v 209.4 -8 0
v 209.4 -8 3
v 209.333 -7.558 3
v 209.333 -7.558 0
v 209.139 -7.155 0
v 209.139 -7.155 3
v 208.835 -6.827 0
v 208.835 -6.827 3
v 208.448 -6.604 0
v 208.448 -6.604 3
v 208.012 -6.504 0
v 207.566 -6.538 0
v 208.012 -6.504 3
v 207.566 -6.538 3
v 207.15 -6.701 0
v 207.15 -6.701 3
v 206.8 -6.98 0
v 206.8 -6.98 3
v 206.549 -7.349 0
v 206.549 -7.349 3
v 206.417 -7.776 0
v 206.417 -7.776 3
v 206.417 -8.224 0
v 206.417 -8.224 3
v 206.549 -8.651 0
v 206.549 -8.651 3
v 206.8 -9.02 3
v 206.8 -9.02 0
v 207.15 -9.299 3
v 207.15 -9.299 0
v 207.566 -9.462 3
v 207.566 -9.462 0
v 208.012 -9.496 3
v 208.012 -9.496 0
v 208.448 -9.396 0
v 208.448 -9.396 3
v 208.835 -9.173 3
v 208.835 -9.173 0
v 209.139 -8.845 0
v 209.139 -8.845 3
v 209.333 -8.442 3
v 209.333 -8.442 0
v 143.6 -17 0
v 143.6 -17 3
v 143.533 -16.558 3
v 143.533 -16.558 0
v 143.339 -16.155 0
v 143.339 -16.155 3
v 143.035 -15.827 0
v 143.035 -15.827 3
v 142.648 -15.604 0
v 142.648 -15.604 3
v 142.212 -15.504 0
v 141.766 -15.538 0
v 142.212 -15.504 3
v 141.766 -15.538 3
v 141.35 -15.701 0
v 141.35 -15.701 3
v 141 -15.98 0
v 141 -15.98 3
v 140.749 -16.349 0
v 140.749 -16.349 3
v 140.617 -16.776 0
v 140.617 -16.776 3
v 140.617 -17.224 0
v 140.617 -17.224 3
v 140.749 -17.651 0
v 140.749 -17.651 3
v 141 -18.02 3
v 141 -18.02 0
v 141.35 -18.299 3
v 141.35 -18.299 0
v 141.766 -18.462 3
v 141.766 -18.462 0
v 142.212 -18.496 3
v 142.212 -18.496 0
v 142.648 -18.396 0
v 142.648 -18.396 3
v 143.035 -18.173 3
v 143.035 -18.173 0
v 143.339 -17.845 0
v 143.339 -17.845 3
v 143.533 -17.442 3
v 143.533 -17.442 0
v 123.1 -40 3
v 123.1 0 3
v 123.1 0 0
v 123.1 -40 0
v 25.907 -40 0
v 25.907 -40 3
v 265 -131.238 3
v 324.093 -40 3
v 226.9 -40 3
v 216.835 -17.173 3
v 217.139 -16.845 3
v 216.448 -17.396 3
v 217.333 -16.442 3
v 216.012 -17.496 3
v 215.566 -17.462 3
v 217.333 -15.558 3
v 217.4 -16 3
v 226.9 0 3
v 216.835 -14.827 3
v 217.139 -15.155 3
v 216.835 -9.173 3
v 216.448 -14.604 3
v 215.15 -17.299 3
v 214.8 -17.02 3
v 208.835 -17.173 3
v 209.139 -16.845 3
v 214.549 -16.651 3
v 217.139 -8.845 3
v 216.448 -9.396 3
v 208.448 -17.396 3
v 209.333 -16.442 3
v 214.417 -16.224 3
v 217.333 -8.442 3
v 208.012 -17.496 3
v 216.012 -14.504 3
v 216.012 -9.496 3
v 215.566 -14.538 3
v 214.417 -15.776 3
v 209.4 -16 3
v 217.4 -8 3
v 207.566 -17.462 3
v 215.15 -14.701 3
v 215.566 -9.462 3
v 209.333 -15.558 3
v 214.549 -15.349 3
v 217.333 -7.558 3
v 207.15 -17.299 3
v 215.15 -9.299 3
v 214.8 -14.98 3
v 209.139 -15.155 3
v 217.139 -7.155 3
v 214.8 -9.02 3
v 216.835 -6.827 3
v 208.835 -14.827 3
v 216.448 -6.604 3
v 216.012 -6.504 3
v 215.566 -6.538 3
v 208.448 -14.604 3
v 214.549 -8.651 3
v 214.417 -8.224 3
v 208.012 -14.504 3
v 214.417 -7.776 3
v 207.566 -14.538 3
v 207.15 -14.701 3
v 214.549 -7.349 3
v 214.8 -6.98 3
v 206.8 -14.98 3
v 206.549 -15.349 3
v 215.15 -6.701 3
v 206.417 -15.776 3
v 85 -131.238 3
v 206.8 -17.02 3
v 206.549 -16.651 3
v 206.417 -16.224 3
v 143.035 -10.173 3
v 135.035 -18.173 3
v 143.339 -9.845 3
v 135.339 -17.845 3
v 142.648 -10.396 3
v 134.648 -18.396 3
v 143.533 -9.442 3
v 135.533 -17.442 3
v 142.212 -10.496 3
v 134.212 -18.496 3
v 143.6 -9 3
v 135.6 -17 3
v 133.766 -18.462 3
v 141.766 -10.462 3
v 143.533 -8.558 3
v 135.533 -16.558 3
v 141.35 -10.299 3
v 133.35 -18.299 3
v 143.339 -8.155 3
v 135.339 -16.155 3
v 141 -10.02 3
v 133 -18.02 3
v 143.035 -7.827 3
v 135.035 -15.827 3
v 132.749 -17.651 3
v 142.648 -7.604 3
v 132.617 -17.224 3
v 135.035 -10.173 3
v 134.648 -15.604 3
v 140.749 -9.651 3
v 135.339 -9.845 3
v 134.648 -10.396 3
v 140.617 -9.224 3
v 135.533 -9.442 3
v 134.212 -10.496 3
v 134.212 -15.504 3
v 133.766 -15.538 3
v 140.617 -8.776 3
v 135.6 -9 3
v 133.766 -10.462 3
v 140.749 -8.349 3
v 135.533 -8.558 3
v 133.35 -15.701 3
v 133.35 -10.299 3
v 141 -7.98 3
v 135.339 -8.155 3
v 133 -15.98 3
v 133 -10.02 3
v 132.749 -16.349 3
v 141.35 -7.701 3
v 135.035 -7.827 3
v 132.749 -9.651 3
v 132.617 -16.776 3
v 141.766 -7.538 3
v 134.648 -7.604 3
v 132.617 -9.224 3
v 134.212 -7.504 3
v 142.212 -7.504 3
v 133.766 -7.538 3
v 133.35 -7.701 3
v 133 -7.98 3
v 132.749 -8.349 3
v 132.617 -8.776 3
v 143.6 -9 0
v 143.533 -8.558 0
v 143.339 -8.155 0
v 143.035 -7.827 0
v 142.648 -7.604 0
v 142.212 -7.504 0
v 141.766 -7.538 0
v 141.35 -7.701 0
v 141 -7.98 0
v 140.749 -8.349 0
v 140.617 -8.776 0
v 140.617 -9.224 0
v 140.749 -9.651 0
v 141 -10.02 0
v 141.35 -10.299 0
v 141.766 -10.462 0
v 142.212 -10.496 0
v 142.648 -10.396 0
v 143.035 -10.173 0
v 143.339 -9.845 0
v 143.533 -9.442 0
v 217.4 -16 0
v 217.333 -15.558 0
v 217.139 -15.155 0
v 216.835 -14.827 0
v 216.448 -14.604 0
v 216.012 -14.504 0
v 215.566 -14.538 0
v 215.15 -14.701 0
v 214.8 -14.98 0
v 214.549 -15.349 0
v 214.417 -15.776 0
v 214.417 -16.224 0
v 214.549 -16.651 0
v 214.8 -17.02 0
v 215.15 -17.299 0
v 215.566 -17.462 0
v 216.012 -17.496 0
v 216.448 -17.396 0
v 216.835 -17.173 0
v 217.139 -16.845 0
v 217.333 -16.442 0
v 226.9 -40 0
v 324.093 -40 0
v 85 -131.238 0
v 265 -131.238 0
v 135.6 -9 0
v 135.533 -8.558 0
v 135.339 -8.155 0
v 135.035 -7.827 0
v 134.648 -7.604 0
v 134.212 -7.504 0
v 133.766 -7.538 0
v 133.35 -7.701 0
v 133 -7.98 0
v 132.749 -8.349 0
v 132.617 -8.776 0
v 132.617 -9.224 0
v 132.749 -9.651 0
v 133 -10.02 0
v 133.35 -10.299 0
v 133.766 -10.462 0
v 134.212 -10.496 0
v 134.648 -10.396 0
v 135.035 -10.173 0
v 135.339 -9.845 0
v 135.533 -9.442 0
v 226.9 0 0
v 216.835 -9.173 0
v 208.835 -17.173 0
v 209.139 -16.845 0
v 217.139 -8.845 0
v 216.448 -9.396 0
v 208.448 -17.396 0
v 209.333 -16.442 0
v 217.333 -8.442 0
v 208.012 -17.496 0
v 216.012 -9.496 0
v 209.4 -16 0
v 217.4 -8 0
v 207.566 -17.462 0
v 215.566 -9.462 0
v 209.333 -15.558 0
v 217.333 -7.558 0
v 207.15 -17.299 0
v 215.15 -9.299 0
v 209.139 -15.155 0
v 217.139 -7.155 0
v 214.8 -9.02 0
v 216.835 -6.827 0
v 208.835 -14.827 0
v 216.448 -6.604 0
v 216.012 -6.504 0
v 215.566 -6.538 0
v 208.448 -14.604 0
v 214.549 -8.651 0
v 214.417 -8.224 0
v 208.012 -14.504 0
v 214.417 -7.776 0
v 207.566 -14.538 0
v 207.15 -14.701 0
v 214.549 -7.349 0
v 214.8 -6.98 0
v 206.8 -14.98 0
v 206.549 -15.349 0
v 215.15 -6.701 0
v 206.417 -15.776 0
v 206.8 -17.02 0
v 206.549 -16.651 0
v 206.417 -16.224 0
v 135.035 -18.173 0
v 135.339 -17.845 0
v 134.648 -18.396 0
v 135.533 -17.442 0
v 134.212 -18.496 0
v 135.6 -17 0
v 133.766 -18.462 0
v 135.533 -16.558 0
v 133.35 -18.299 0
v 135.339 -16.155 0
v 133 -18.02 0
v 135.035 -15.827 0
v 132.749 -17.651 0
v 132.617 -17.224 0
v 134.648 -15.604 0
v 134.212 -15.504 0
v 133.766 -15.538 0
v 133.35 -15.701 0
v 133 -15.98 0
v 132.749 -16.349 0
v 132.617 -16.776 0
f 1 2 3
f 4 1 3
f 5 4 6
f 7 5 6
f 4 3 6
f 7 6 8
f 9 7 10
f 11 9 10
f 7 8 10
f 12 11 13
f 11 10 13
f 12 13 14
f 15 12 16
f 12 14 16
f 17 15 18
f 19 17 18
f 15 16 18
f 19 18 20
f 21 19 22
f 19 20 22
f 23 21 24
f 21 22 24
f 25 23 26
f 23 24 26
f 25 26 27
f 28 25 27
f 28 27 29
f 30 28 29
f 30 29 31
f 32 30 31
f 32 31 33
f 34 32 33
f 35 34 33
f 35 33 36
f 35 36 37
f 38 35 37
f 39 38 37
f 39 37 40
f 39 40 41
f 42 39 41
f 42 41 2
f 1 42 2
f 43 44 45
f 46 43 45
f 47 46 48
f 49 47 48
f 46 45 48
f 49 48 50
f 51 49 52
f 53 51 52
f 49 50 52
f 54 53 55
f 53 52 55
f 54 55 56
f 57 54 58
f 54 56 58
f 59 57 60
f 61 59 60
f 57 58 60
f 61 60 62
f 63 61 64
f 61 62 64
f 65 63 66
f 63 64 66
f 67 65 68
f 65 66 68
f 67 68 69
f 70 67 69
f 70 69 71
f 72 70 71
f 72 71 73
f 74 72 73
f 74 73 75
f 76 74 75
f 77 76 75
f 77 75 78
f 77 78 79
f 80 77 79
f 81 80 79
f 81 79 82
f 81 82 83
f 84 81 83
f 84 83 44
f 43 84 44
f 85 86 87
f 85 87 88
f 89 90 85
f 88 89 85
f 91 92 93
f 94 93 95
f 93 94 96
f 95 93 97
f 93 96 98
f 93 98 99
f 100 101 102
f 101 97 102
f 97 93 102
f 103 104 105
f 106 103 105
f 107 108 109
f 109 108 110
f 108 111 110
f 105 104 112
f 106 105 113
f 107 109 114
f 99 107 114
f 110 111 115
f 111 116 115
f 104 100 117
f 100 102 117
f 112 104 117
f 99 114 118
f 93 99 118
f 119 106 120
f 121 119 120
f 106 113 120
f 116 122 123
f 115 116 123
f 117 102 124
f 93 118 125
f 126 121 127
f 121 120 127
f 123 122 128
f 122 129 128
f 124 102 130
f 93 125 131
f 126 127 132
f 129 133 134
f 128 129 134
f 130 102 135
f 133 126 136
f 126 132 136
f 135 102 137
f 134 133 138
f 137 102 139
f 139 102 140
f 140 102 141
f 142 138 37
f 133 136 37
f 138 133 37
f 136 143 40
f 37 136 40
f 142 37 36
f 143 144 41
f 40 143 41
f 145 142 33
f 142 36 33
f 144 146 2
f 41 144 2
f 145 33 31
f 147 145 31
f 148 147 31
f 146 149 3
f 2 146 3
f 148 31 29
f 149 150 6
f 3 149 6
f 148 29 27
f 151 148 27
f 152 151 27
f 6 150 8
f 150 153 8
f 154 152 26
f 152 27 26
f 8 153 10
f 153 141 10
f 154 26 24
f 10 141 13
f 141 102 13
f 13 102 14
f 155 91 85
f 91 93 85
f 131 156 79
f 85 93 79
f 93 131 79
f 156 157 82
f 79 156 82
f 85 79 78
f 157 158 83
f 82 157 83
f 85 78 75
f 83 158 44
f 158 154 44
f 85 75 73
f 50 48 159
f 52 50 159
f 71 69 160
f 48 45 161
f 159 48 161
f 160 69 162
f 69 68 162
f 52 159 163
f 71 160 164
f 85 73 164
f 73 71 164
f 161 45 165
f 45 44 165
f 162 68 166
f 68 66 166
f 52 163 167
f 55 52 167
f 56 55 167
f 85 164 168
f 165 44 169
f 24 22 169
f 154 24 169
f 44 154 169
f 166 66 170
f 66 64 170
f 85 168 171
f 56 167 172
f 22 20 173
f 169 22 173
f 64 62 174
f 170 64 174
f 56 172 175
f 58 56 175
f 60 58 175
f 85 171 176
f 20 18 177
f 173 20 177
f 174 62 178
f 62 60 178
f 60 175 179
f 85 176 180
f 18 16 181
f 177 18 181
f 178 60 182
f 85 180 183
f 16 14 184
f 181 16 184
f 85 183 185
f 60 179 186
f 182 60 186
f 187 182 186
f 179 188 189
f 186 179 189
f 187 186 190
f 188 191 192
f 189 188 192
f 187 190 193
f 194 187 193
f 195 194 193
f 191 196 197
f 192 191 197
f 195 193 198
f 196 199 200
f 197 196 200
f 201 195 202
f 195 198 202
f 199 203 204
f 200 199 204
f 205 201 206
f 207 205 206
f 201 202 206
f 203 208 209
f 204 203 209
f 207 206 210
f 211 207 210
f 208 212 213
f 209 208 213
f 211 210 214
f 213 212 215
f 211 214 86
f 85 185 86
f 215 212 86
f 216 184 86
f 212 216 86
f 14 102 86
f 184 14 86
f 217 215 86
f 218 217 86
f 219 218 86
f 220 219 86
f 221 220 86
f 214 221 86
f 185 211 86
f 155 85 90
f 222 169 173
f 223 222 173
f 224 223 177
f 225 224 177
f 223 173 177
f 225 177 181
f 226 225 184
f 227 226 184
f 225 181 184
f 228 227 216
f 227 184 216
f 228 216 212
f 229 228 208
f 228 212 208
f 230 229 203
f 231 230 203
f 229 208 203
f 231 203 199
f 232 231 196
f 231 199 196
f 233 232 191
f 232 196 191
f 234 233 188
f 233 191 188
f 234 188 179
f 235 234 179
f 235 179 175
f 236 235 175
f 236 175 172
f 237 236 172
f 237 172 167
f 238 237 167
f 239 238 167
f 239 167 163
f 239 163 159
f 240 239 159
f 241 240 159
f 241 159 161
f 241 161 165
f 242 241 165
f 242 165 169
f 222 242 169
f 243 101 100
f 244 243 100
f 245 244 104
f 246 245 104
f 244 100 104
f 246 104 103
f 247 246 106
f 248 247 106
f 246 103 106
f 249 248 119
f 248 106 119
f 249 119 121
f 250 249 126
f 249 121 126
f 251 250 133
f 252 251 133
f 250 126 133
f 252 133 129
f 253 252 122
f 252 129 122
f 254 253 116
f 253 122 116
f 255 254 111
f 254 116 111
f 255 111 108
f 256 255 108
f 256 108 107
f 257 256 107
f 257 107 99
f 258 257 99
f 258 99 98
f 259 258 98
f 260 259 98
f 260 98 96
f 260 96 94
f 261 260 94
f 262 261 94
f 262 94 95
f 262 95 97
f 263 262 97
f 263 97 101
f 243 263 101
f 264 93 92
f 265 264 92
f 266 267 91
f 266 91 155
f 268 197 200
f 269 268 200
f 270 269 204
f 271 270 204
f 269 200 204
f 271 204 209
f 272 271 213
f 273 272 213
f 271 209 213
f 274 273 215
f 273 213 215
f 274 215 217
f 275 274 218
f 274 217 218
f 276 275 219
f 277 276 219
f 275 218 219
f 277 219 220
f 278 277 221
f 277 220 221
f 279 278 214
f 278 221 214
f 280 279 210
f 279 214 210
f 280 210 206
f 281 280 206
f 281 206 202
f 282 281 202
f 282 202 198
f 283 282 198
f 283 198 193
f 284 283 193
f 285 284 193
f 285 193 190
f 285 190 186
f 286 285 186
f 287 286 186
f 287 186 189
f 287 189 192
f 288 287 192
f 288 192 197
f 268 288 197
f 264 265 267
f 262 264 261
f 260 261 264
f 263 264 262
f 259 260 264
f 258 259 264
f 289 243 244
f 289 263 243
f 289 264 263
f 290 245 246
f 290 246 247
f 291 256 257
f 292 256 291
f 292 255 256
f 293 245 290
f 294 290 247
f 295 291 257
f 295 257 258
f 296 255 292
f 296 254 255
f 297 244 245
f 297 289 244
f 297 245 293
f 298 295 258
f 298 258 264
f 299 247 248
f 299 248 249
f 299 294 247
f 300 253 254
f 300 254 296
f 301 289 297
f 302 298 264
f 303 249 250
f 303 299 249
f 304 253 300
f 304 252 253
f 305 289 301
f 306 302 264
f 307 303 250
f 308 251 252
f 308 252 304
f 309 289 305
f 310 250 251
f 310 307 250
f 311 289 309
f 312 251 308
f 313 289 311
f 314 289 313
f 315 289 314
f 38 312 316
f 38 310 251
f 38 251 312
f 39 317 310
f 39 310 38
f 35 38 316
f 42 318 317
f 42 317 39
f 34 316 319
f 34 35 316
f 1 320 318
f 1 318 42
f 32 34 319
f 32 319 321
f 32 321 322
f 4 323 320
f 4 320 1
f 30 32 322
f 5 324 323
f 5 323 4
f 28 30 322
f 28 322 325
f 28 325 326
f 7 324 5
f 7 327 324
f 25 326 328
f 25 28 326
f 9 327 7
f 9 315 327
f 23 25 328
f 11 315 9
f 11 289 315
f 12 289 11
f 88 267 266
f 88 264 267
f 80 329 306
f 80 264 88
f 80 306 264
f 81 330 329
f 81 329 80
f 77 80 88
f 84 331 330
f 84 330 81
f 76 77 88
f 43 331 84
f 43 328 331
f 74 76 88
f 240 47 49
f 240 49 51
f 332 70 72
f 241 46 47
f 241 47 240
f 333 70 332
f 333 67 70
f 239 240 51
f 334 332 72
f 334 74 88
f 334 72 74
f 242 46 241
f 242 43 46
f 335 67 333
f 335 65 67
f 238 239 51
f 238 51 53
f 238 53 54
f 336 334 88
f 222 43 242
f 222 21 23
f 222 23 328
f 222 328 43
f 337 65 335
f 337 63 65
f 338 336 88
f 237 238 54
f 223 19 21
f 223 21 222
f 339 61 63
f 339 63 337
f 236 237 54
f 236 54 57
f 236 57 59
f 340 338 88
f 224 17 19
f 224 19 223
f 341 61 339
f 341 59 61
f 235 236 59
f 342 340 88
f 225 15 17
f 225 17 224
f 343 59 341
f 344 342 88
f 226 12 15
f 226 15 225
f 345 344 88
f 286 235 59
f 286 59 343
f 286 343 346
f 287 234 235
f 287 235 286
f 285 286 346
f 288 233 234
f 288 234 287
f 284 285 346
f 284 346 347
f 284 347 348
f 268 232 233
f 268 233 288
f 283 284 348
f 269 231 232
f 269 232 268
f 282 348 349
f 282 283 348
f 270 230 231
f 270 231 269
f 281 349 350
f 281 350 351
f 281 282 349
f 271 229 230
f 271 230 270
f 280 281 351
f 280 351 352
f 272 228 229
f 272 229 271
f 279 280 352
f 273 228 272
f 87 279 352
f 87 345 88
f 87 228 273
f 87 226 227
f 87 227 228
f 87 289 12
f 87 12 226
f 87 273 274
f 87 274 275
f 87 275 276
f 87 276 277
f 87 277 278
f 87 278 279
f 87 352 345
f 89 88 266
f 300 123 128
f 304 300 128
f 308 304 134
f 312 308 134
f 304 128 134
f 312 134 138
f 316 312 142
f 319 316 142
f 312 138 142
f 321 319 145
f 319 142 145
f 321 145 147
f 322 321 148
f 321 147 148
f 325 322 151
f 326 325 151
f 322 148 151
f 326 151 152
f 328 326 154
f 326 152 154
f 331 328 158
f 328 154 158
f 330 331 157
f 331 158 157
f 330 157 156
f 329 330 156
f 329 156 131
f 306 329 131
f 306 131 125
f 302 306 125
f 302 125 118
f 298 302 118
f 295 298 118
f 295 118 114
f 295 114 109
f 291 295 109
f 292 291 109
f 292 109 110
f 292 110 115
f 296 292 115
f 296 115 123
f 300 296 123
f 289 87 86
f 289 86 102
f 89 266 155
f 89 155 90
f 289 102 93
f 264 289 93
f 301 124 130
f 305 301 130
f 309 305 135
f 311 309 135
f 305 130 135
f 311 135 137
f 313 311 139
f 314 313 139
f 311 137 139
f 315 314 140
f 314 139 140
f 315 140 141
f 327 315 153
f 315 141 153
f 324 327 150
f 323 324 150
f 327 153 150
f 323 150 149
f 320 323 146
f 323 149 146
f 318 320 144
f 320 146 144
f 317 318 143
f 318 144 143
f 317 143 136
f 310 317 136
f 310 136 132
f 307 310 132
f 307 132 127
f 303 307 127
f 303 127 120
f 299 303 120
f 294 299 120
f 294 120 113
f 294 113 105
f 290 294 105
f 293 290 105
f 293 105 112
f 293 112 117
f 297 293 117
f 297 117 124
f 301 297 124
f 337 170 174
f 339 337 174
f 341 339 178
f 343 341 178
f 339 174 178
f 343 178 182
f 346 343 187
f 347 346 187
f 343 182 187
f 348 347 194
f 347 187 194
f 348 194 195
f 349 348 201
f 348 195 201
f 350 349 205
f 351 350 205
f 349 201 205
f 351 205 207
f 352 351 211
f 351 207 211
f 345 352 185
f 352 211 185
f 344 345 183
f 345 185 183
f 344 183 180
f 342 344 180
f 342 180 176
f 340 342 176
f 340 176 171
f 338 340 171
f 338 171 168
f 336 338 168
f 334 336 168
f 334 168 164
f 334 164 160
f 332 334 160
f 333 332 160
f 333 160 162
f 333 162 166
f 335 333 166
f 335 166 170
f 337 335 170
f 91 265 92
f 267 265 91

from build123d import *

# Parameters (mm, degrees)
EXTRUDE_1_DEPTH     = 3
CUT_EXTRUDE_1_DEPTH = 10
SKETCH_3_R          = 1.5
CUT_EXTRUDE_2_DEPTH = 10


with BuildPart() as part:
    # 草图1 → 凸台-拉伸1 (new body)
    with BuildSketch(Plane.XY):
        Polygon((100, 0), (250, 0), (250, -30), (330.569672928, -30), (265, -131.238140798), (85, -131.238140798), (19.430327072, -30), (100, -30), align=None)
    extrude(amount=EXTRUDE_1_DEPTH)

    # 草图2 → 切除-拉伸1 (cut)
    with BuildSketch(Plane.XY.offset(3)):
        Polygon((250, -40), (324.092897238, -40), (330.569672928, -30), (250, -30), (250, 0), (226.9, 0), (226.9, -40), align=None)
        Polygon((100, -40), (25.907102762, -40), (19.430327072, -30), (100, -30), (100, 0), (123.1, 0), (123.1, -40), align=None)
    extrude(amount=-CUT_EXTRUDE_1_DEPTH, mode=Mode.SUBTRACT)

    # 草图3 → 切除-拉伸2 (cut)
    with BuildSketch(Plane.XY.offset(3)):
        with Locations((134.1, -9)):
            Circle(SKETCH_3_R)
        with Locations((134.1, -17)):
            Circle(SKETCH_3_R)
        with Locations((142.1, -9)):
            Circle(SKETCH_3_R)
        with Locations((142.1, -17)):
            Circle(SKETCH_3_R)
        with Locations((207.9, -8)):
            Circle(SKETCH_3_R)
        with Locations((215.9, -8)):
            Circle(SKETCH_3_R)
        with Locations((207.9, -16)):
            Circle(SKETCH_3_R)
        with Locations((215.9, -16)):
            Circle(SKETCH_3_R)
    extrude(amount=-CUT_EXTRUDE_2_DEPTH, mode=Mode.SUBTRACT)


solid = part.part
